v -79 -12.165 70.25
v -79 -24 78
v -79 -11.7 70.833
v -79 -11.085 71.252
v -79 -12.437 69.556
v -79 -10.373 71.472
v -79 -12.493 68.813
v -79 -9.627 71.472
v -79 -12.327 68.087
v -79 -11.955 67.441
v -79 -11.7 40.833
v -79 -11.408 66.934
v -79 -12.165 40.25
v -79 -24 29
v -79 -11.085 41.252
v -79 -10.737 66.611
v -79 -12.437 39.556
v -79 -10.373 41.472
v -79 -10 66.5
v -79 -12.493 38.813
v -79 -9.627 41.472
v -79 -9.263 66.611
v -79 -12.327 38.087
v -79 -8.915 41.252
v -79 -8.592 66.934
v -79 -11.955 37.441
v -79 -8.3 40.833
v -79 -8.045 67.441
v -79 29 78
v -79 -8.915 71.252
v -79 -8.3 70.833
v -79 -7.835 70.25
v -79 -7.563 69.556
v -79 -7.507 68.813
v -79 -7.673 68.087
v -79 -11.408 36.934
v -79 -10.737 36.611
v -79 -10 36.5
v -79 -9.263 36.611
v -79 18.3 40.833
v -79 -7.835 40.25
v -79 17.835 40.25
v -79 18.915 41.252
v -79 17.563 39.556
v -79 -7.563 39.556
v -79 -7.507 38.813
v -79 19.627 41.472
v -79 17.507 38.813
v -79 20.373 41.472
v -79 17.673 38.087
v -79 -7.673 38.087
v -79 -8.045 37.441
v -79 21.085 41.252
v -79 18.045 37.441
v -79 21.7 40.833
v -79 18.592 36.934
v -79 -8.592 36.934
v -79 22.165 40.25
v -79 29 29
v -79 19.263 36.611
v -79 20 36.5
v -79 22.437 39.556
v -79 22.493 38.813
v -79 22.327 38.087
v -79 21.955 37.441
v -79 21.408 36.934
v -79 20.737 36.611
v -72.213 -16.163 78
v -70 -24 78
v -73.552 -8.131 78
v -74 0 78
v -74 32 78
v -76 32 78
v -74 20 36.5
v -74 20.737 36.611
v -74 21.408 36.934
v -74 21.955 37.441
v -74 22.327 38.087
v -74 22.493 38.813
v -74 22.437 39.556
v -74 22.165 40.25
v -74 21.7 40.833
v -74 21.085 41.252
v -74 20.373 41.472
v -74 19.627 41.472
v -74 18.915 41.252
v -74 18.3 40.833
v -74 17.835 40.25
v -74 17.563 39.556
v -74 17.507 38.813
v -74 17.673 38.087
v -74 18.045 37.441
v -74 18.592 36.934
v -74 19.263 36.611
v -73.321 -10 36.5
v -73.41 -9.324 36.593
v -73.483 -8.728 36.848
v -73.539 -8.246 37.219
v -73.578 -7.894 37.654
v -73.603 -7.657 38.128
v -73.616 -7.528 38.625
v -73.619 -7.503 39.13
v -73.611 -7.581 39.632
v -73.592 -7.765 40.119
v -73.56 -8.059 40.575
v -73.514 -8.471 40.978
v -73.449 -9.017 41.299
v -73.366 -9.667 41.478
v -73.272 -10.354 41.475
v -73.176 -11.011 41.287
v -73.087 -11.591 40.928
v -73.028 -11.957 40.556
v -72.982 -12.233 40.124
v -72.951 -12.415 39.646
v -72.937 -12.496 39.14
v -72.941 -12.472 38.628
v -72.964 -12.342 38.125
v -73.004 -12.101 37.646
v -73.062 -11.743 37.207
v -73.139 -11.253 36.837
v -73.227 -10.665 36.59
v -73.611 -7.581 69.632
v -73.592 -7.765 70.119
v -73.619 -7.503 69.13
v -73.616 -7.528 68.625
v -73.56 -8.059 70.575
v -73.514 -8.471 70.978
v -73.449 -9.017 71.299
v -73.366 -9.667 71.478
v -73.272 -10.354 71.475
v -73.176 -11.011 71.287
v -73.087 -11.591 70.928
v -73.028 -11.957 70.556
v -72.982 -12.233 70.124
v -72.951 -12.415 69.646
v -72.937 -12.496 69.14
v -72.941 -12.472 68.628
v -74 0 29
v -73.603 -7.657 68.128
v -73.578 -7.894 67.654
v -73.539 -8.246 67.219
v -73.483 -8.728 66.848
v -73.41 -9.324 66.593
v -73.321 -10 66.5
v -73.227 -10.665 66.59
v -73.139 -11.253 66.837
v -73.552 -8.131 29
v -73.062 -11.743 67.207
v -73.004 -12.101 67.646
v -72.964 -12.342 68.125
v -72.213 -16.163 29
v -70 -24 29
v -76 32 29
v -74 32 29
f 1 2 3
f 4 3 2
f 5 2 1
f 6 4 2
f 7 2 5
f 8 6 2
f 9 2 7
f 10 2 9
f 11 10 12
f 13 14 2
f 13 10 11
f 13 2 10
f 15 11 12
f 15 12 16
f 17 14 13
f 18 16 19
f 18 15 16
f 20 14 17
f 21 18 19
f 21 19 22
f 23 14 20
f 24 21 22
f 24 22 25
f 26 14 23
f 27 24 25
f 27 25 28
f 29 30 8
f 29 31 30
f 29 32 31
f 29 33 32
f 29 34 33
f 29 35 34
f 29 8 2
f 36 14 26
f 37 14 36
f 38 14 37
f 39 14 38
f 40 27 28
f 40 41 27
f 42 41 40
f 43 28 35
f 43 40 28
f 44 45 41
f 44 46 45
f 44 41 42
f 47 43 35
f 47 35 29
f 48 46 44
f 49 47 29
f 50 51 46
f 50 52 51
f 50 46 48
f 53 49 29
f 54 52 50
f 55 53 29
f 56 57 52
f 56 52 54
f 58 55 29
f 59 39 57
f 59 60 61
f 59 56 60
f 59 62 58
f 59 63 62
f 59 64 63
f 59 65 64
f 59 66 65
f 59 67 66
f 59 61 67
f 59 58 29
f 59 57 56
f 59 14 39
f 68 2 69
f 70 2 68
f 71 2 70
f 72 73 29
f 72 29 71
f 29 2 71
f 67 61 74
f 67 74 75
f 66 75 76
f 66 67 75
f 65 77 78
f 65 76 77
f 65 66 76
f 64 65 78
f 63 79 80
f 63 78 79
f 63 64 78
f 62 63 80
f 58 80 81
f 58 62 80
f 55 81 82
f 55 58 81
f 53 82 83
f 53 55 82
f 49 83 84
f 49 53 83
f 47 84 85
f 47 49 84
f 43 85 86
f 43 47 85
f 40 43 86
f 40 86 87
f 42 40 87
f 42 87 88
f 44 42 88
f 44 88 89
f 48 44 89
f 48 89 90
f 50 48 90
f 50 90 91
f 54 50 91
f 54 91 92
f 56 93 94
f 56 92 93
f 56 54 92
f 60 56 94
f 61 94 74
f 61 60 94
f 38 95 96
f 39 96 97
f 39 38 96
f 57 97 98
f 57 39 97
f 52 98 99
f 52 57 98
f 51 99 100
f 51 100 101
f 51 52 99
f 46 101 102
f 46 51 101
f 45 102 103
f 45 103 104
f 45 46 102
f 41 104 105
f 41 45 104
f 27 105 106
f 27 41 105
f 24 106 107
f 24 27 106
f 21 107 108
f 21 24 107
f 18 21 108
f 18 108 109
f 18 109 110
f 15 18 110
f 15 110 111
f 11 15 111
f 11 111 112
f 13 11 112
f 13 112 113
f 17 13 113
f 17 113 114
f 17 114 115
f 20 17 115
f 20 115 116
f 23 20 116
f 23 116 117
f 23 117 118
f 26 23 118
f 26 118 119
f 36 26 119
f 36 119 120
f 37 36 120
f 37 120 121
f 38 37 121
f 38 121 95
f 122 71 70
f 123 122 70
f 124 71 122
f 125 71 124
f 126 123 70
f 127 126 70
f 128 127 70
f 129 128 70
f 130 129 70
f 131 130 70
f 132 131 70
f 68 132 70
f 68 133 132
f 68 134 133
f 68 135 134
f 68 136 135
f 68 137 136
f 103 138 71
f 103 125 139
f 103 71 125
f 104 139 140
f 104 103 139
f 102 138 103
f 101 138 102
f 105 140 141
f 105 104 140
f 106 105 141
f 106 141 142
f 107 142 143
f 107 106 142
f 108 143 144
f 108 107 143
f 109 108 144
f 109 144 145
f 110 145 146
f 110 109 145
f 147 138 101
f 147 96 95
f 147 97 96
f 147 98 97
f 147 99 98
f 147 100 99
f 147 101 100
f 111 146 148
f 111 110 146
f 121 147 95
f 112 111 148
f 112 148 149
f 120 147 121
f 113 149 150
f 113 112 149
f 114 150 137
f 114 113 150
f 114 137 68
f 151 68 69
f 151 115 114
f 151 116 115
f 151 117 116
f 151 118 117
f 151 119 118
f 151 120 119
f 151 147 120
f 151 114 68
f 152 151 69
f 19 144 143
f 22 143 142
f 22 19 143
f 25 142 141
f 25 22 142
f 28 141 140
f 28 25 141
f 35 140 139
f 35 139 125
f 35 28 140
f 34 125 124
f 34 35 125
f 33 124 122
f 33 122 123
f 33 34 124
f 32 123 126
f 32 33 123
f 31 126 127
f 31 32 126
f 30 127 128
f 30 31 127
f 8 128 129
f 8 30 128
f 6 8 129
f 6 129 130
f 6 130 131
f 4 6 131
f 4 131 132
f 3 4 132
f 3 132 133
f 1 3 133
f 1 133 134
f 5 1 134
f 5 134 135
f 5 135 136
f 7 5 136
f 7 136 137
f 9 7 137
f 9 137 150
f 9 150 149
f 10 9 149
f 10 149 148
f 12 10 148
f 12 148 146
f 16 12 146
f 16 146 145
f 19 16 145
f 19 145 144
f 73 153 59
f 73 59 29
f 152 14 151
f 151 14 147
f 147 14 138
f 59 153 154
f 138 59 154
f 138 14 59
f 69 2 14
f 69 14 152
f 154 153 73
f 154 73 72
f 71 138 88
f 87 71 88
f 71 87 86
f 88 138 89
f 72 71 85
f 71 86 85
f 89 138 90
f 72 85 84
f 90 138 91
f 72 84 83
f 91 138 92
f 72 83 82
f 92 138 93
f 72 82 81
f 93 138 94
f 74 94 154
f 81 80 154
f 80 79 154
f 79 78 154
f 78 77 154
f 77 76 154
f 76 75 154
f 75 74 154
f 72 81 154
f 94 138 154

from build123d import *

# Parameters (mm, degrees)
BOX750_W           = 148
BOX750_H           = 74
BOX750_DEPTH       = 55
CYLINDER1790_R     = 74
CYLINDER1790_DEPTH = 60
CYLINDER1795_R     = 2.5
CYLINDER1795_DEPTH = 40
CYLINDER1791_R     = 2.5
CYLINDER1791_DEPTH = 40
CYLINDER1794_R     = 2.5
CYLINDER1794_DEPTH = 40
BOX755_W           = 10
BOX755_H           = 56
BOX755_DEPTH       = 49
CHAMFER061_SIZE    = 3


with BuildPart() as krychle750:
    # Box750 → Box750 (new body)
    with BuildSketch(Plane(origin=(-74, 0, 29), x_dir=(1, 0, 0), z_dir=(0, 0, 1))):
        with Locations((74, 37)):
            Rectangle(BOX750_W, BOX750_H)
    extrude(amount=BOX750_DEPTH)


with BuildPart() as v_lec1790:
    # Cylinder1790 → Cylinder1790 (new body)
    with BuildSketch(Plane.XY.offset(26)):
        Circle(CYLINDER1790_R)
    extrude(amount=CYLINDER1790_DEPTH)


with BuildPart() as v_lec1795:
    # Cylinder1795 → Cylinder1795 (new body)
    with BuildSketch(Plane(origin=(-86, 20, 39), x_dir=(0, 0, -1), z_dir=(1, 0, 0))):
        Circle(CYLINDER1795_R)
    extrude(amount=CYLINDER1795_DEPTH)


with BuildPart() as v_lec1791:
    # Cylinder1791 → Cylinder1791 (new body)
    with BuildSketch(Plane(origin=(-86, -10, 69), x_dir=(0, 0, -1), z_dir=(1, 0, 0))):
        Circle(CYLINDER1791_R)
    extrude(amount=CYLINDER1791_DEPTH)


with BuildPart() as compound910:
    # Cylinder1794 → Cylinder1794 (new body)
    with BuildSketch(Plane(origin=(-86, -10, 39), x_dir=(0, 0, -1), z_dir=(1, 0, 0))):
        Circle(CYLINDER1794_R)
    extrude(amount=CYLINDER1794_DEPTH)

    # Compound910: union Válec1795, Válec1791
    add(v_lec1795.part)
    add(v_lec1791.part)


with BuildPart() as cut551:
    # Box755 → Box755 (new body)
    with BuildSketch(Plane(origin=(-79, -24, 29), x_dir=(1, 0, 0), z_dir=(0, 0, 1))):
        with Locations((5, 28)):
            Rectangle(BOX755_W, BOX755_H)
    extrude(amount=BOX755_DEPTH)

    # Chamfer061
    chamfer061_edges = [cut551.edges().sort_by_distance(p)[0] for p in [
        (-79, 32, 53.5),
    ]]
    chamfer(chamfer061_edges, length=CHAMFER061_SIZE)

    # Cut549: cut Compound910
    add(compound910.part, mode=Mode.SUBTRACT)

    # Cut550: cut Válec1790
    add(v_lec1790.part, mode=Mode.SUBTRACT)

    # Cut551: cut Krychle750
    add(krychle750.part, mode=Mode.SUBTRACT)


solid = cut551.part
